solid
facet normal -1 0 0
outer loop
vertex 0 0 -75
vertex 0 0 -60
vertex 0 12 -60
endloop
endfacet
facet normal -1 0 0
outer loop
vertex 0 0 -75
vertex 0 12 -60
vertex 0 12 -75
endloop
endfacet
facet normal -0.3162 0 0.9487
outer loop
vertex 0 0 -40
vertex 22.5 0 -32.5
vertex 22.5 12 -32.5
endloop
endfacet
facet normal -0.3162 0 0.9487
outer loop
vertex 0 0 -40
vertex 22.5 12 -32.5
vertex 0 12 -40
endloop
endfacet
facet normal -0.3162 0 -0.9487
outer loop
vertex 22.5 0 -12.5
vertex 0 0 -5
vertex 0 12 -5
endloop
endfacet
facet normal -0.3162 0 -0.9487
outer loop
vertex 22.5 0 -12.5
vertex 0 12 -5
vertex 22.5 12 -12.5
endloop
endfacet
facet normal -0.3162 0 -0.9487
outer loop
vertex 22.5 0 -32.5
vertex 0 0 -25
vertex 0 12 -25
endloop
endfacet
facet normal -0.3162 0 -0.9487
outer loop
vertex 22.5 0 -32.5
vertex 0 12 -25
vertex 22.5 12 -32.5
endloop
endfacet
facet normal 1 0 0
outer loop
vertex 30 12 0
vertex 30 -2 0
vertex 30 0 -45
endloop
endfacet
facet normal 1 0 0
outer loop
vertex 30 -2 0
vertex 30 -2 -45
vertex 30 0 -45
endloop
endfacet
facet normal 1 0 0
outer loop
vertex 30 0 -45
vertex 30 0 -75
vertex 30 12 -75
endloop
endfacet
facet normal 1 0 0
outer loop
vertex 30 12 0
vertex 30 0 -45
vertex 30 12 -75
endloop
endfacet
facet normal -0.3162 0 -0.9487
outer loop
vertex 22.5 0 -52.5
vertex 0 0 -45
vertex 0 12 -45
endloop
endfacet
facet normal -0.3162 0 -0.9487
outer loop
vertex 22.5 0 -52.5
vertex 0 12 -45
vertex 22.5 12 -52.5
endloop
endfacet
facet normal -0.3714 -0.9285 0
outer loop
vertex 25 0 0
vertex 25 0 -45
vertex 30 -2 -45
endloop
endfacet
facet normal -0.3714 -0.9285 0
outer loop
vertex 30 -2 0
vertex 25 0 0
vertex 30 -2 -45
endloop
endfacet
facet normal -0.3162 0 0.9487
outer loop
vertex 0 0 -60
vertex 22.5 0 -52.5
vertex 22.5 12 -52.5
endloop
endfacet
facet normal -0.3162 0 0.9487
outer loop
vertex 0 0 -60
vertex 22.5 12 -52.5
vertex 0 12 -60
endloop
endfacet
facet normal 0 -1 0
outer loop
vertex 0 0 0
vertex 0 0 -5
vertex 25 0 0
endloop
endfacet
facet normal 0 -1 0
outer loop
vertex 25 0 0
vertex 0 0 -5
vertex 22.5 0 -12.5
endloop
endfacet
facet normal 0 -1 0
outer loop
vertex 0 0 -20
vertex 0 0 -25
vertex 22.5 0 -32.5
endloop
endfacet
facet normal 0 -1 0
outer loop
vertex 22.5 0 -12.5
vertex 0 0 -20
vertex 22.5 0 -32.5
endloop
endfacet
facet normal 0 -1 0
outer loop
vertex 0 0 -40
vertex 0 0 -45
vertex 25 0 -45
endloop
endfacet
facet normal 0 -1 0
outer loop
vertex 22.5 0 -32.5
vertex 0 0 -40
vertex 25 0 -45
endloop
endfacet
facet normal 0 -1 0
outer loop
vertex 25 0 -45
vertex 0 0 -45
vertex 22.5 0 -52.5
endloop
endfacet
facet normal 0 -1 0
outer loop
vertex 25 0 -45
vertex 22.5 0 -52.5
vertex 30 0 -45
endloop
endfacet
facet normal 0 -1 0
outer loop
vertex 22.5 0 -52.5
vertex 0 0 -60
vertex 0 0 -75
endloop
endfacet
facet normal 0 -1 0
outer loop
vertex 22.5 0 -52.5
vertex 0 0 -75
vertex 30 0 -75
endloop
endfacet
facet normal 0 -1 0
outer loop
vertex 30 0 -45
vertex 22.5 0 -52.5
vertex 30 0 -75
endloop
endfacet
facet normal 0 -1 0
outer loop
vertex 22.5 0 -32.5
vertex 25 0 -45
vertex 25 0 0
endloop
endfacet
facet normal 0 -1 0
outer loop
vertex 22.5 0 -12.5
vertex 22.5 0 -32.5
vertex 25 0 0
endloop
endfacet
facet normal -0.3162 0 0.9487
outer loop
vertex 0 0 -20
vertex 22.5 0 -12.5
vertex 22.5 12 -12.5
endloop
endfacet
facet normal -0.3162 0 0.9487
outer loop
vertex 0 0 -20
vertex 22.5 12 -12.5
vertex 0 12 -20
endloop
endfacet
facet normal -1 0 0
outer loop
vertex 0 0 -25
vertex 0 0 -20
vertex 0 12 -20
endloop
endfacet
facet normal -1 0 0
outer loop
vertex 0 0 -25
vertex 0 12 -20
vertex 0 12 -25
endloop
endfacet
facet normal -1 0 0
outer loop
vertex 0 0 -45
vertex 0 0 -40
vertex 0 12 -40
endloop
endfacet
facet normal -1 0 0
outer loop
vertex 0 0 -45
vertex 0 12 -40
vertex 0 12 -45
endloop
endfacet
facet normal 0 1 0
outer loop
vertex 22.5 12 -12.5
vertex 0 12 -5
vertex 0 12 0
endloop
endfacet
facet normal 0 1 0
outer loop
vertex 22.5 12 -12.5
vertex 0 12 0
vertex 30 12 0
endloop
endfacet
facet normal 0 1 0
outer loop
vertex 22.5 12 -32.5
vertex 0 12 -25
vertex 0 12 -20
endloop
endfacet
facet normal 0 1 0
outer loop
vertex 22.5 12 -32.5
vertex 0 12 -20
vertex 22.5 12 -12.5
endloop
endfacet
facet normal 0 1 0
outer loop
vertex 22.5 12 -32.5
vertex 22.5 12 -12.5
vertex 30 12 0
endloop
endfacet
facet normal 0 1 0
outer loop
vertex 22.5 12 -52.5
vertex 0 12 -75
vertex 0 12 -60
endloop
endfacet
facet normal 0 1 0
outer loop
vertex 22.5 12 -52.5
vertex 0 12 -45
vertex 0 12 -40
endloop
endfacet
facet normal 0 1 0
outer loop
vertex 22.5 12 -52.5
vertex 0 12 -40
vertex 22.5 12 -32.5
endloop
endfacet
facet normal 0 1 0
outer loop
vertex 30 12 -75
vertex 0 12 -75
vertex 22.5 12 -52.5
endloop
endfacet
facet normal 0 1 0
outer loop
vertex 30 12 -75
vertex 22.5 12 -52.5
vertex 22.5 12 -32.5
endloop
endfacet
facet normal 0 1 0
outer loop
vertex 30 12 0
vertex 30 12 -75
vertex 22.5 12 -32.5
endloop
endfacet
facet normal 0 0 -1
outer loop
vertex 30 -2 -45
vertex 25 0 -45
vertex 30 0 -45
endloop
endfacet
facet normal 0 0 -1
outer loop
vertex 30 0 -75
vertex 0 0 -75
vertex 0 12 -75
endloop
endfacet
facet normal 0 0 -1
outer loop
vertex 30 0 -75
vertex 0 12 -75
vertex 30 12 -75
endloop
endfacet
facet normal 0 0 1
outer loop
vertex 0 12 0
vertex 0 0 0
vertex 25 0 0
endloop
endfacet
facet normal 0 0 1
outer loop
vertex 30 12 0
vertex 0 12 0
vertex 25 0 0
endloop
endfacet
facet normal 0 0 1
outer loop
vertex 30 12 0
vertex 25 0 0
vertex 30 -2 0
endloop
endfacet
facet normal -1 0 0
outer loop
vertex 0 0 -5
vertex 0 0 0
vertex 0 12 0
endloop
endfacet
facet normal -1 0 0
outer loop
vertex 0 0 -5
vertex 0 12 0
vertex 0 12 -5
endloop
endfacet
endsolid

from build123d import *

# Parameters (mm, degrees)
SKETCH1_W           = 30
SKETCH1_H           = 75
BOSS_EXTRUDE1_DEPTH = 12
CUT_EXTRUDE1_DEPTH  = 12
LPATTERN1_COUNT     = 3
LPATTERN1_PITCH     = 20
BOUNDARY1_START     = -45
BOUNDARY1_DEPTH     = 5
LPATTERN2_COUNT     = 9
LPATTERN2_PITCH     = 5


# Read off the part's stored shape, not the designer's step: Boundary1
with BuildPart() as part:
    # Sketch1 → Boss-Extrude1 (new body)
    with BuildSketch(Plane(origin=(0, 0, 0), x_dir=(1, 0, 0), z_dir=(0, 1, 0))):
        with Locations((15, 37.5)):
            Rectangle(SKETCH1_W, SKETCH1_H)
    extrude(amount=BOSS_EXTRUDE1_DEPTH)

    # Sketch3 → Cut-Extrude1 (cut)
    with BuildSketch(Plane(origin=(0, 0, 0), x_dir=(1, 0, 0), z_dir=(0, 1, 0))):
        Polygon((0, 5), (22.5, 12.5), (0, 20), align=None)
    cut_extrude1 = extrude(amount=CUT_EXTRUDE1_DEPTH, mode=Mode.SUBTRACT)

    # LPattern1: Cut-Extrude1 ×3
    with Locations(*[(0, 0, -i * LPATTERN1_PITCH) for i in range(1, LPATTERN1_COUNT)]):
        add(cut_extrude1, mode=Mode.SUBTRACT)

    # Boundary1 outline → Boundary1 (add)
    with BuildSketch(Plane.XY.offset(BOUNDARY1_START)):
        Polygon((30, 0), (25, 0), (30, -2), align=None)
    boundary1 = extrude(amount=BOUNDARY1_DEPTH)

    # LPattern2: Boundary1 ×9
    with Locations(*[(0, 0, i * LPATTERN2_PITCH) for i in range(1, LPATTERN2_COUNT)]):
        add(boundary1)


solid = part.part
